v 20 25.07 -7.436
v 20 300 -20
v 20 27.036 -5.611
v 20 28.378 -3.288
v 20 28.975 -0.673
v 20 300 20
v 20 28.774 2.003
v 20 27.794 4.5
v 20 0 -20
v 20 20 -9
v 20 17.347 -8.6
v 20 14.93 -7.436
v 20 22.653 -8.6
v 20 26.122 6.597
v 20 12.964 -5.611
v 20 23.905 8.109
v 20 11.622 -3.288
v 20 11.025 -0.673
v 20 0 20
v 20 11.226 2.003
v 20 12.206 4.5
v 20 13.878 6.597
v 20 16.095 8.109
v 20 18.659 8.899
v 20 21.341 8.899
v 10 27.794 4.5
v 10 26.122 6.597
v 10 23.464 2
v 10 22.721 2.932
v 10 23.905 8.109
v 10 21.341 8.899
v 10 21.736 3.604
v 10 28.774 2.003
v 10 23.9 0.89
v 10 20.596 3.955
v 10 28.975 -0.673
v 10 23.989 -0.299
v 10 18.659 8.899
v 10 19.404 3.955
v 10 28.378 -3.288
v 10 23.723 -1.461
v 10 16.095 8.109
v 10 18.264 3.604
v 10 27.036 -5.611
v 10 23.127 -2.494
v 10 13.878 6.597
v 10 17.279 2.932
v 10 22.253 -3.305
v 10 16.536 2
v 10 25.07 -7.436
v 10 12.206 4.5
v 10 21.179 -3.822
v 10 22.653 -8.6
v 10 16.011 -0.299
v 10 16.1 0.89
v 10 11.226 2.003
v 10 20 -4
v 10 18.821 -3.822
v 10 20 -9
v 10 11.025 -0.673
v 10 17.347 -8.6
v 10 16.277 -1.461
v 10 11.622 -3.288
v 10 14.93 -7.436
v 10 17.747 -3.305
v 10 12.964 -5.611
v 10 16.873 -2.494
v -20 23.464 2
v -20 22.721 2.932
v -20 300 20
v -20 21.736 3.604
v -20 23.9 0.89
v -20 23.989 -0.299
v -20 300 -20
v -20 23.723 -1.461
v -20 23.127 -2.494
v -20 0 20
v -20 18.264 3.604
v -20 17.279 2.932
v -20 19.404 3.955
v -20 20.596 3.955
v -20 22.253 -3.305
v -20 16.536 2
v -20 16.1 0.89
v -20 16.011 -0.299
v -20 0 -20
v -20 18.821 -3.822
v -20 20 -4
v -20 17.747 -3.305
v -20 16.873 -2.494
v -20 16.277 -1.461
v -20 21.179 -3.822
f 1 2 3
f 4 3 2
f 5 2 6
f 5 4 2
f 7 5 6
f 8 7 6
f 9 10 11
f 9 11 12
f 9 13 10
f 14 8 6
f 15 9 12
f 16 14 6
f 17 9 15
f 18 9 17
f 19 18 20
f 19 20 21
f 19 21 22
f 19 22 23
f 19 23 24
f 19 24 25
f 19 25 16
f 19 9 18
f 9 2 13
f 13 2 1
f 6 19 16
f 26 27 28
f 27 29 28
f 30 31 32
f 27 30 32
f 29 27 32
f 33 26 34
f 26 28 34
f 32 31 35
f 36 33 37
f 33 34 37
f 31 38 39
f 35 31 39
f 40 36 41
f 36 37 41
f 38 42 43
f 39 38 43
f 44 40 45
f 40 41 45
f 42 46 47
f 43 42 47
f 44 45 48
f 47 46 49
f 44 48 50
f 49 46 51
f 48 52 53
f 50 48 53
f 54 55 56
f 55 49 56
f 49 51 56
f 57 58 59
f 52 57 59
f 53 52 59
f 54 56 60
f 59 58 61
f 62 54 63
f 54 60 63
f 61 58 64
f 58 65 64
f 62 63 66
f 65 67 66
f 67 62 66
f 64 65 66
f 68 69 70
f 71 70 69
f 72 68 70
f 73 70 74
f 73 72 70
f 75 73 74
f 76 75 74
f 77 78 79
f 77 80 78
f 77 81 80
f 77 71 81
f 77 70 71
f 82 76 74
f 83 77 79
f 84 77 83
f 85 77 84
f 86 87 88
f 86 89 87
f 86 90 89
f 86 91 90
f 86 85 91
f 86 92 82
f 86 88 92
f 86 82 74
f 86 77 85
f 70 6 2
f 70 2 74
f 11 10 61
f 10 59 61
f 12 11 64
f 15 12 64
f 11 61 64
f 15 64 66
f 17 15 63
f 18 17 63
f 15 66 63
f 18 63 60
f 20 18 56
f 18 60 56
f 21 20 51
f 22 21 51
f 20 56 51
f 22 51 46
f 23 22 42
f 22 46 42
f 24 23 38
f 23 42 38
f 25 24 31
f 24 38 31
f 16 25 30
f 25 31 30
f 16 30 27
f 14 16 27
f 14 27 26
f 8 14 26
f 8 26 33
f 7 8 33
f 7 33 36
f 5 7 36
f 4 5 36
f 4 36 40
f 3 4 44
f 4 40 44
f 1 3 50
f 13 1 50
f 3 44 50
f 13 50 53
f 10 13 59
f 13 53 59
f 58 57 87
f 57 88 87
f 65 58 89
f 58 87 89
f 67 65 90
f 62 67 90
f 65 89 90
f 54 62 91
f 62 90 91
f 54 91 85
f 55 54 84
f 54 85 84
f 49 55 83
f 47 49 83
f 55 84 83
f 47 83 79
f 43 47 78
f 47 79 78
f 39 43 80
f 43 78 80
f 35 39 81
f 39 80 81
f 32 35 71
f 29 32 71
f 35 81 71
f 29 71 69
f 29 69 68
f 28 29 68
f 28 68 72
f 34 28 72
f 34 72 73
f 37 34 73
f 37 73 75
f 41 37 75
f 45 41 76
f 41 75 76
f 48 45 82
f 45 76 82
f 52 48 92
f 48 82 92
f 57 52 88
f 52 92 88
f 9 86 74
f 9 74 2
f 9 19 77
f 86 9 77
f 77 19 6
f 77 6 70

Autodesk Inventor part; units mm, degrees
ref_plane "YZ Plane" through (0, 0, 0) normal (1, 0, 0) x (0, 1, 0)
ref_plane "XZ Plane" through (0, 0, 0) normal (0, 1, 0) x (-1, 0, 0)
ref_plane "XY Plane" through (0, 0, 0) normal (0, 0, 1) x (1, 0, 0)
sketch "Skizze1" plane through (0, 0, 0) normal (0, 1, 0) x (-1, 0, 0)
  line L0 (-20, 20) -> (20, 20)
  line L1 (20, 20) -> (20, -20)
  line L2 (20, -20) -> (-20, -20)
  line L3 (-20, -20) -> (-20, 20)
  line L4 (-20, 20) -> (20, -20) construction
  line L5 (20, 20) -> (-20, -20) construction
  point P0 (0, 0)
  dimension "d2" = 40
  dimension "d3" = 40
extrude "Extrusion1" add sketch "Skizze1" along normal blind 300
sketch "Skizze2" plane through (20, 0, 20) normal (1, 0, 0) x (0, 0, -1)
  line L0 (0, 0) -> (40, 0) projected
  point P0 (20, 0)
  point P1 (20, 20)
  point P2 (20, 0)
  dimension "d4" = 20
hole "Bohrung1" at (20, 20, 0) direction (-1, 0, 0) diameter 8 end through all counterbore diameter 18 counterbore depth 10
equation "\"d3\" = d2"
properties part number "Adrian_Cameraarmseiten"
